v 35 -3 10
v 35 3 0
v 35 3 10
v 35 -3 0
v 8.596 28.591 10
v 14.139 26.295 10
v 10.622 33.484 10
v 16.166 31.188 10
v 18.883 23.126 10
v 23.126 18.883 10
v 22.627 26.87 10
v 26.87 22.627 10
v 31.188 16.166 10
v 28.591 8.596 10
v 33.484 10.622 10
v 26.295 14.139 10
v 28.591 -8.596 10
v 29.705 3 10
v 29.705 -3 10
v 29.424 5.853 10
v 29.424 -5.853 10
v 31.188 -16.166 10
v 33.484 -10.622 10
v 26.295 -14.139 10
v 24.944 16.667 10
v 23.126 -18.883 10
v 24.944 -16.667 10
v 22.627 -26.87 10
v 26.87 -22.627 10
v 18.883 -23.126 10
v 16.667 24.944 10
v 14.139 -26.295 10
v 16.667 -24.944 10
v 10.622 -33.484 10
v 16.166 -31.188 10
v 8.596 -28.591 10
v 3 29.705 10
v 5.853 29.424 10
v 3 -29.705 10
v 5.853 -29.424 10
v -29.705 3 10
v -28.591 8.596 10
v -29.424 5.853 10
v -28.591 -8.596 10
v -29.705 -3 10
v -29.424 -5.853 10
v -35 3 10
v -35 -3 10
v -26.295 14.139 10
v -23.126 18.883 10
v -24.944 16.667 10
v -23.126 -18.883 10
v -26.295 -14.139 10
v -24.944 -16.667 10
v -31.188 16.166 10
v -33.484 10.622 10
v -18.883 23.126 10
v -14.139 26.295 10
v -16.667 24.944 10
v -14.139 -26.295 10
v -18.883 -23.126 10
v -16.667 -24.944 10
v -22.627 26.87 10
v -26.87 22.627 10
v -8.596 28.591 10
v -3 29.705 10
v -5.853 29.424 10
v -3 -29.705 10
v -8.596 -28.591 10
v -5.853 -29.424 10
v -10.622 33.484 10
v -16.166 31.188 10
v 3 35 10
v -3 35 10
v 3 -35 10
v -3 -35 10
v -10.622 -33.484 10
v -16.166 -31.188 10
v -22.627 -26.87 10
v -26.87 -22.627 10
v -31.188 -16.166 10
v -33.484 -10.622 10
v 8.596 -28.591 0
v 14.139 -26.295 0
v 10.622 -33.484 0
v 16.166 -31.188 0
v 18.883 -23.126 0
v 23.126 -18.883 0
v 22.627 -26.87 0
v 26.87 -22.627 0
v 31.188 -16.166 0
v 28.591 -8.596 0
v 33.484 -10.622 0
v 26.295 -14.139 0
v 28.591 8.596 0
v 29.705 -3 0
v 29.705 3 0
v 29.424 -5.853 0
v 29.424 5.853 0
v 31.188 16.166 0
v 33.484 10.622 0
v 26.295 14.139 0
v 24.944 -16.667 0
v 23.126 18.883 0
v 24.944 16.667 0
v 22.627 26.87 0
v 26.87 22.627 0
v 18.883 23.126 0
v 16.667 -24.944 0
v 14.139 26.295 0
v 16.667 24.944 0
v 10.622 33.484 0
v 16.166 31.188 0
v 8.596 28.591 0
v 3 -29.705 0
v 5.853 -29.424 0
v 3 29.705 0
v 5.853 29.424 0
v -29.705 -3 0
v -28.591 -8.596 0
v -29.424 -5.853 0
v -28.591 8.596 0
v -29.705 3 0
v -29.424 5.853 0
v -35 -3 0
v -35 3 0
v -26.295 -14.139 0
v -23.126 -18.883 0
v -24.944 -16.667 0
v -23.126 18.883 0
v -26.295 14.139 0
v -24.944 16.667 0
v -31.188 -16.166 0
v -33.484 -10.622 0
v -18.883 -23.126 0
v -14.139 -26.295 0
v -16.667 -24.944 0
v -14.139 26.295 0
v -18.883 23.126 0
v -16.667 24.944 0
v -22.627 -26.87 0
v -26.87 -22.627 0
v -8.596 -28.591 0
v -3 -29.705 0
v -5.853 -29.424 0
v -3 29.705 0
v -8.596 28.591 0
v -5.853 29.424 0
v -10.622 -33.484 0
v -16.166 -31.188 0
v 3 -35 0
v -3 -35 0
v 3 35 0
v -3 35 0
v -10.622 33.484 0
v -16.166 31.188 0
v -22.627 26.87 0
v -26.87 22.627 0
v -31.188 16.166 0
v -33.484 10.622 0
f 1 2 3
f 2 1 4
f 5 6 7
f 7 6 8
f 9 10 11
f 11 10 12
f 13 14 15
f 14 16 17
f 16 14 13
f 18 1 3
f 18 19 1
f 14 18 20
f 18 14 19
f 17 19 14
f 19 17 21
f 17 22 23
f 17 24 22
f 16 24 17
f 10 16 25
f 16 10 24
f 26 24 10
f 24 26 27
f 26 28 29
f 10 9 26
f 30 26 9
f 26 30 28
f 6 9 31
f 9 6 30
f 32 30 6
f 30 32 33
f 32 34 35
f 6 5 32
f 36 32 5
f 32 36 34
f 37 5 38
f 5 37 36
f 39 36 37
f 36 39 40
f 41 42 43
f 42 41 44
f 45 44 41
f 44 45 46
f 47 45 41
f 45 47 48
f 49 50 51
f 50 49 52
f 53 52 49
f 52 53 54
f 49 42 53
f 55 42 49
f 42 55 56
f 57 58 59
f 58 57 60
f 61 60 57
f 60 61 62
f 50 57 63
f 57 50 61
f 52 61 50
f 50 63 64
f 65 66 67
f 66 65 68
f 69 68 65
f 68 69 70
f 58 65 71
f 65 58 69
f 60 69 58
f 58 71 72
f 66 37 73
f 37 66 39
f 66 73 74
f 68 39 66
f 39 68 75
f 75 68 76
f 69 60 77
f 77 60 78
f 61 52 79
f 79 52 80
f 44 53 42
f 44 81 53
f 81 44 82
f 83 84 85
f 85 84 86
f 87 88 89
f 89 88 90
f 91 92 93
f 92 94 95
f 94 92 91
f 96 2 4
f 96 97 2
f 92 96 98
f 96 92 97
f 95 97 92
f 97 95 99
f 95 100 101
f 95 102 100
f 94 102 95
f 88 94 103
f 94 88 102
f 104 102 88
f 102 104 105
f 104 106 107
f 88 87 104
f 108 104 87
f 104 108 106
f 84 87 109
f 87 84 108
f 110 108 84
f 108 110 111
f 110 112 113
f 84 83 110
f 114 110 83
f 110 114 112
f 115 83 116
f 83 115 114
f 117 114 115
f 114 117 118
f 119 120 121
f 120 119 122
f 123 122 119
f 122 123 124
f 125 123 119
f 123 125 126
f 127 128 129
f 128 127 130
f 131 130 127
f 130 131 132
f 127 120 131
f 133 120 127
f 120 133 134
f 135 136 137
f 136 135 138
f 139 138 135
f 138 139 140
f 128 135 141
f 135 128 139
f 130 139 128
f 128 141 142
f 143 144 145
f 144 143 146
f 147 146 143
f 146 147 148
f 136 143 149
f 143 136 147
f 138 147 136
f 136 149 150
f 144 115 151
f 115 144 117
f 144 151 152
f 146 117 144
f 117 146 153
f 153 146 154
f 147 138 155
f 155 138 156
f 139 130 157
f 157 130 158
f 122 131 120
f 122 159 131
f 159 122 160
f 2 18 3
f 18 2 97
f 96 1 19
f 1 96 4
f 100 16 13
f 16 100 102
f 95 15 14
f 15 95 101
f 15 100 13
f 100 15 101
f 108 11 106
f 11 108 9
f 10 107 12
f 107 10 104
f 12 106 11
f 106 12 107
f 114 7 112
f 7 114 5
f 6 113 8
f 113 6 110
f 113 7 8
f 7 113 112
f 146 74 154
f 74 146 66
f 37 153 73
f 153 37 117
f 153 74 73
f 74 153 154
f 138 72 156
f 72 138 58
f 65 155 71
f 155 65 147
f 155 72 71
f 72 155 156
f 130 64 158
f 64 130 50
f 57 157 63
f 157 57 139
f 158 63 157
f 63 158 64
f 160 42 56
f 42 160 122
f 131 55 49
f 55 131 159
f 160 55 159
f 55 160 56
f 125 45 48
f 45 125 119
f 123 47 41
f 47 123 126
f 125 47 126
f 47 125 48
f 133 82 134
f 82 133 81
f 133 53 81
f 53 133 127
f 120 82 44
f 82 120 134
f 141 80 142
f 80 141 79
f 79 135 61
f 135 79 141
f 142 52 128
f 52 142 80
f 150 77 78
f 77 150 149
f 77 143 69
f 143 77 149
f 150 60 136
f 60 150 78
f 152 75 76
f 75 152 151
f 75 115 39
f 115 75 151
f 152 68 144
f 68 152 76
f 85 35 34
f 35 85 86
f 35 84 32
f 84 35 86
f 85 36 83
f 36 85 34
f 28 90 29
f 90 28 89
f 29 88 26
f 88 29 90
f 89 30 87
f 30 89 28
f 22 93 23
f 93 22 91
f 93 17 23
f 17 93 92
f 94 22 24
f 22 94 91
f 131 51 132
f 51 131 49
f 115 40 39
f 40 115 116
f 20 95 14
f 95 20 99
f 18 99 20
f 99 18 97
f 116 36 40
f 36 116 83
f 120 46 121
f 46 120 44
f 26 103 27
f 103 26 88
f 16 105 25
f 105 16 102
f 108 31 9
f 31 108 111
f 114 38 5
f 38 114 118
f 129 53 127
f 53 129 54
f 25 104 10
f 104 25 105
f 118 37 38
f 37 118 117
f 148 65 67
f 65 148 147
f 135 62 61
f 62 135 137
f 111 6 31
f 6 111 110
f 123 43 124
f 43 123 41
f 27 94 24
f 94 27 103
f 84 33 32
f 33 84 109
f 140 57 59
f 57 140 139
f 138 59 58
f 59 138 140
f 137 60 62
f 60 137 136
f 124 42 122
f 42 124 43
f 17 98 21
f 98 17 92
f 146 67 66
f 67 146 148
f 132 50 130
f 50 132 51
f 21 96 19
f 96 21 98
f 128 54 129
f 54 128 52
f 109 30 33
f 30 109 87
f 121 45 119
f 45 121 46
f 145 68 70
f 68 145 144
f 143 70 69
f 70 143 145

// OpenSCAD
$fn = 32;

// ----------------------------------------------------------------------
// Spur blank: plain gear blank
// ----------------------------------------------------------------------

// --- parameters (mm) ---
disc_r = 30;              // blank root radius
disc_t = 10;              // blank thickness
n_teeth = 16;             // stub tooth count
tooth_w = 6;              // tooth width at the root
tooth_h = 5;              // tooth height above the root

out_r = disc_r + tooth_h;  // tip radius
bbox_x = 70.0;  // measured width over the teeth
bbox_y = 70.0;  // measured depth over the teeth

union() {
  cylinder(r = disc_r, h = disc_t);
  for (i = [0 : n_teeth - 1])
    rotate([0, 0, i * 360 / n_teeth])
      translate([disc_r - 1, -tooth_w / 2, 0])
        cube([tooth_h + 1, tooth_w, disc_t]);
}
